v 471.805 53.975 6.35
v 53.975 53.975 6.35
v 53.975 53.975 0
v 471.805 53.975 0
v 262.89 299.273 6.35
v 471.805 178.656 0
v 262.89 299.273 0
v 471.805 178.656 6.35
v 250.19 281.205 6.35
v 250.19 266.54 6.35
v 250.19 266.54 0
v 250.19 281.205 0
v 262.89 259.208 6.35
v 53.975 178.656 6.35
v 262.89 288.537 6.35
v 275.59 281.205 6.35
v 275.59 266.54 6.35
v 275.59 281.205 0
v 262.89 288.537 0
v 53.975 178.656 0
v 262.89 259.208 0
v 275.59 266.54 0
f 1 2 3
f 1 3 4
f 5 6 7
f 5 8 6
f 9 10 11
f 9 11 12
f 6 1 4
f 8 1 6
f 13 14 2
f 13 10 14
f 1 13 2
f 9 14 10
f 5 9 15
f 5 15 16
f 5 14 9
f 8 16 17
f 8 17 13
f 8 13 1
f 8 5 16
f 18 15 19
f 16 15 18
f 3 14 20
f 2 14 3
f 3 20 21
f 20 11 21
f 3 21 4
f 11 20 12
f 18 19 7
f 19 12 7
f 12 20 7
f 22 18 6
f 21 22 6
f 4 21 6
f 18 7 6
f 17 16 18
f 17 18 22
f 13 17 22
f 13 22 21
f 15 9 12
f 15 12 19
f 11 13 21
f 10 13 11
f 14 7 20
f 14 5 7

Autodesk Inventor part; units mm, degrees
ref_plane "YZ Plane" through (0, 0, 0) normal (1, 0, 0) x (0, 1, 0)
ref_plane "XZ Plane" through (0, 0, 0) normal (0, 1, 0) x (-1, 0, 0)
ref_plane "XY Plane" through (0, 0, 0) normal (0, 0, 1) x (1, 0, 0)
sketch "Sketch1" plane through (0, 0, 0) normal (0, 0, 1) x (1, 0, 0)
  line L0 (0, 0) -> (0, 201.9592)
  line L1 (0, 201.9592) -> (262.89, 353.7388)
  line L2 (262.89, 353.7388) -> (525.78, 201.9592)
  line L3 (525.78, 201.9592) -> (525.78, 0)
  line L4 (525.78, 0) -> (0, 0)
  point P0 (262.89, 0)
  dimension "d0" = 525.78
  dimension "d1" = 120
  dimension "d2" = 201.9592
extrude "Extrusion1" add sketch "Sketch1" along normal blind 6.35
sketch "Sketch3" plane through (0, 0, 6.35) normal (0, 0, 1) x (1, 0, 0)
  line L0 (50.8, 180.4886) -> (474.98, 180.4886)
  line L1 (474.98, 180.4886) -> (474.98, 50.8)
  line L2 (474.98, 50.8) -> (50.8, 50.8)
  line L3 (50.8, 50.8) -> (50.8, 180.4886)
  line L4 (0, 201.9592) -> (0, 0) projected
  line L5 (50.8, 180.4886) -> (262.89, 302.9388)
  line L6 (262.89, 302.9388) -> (474.98, 180.4886)
  line L7 (525.78, 0) -> (0, 0) projected
  line L8 (0, 201.9592) -> (0, 0) projected
  line L9 (0, 0) -> (525.78, 0) projected
  line L10 (525.78, 0) -> (525.78, 201.9592) projected
  line L11 (525.78, 201.9592) -> (262.89, 353.7388) projected
  line L12 (262.89, 353.7388) -> (0, 201.9592) projected
  point P0 (262.89, 180.4886)
  dimension "d15" = 120
  dimension "d16" = 50.8
  dimension "d17" = 50.8
  dimension "d18" = 50.8
extrude "Extrusion3" cut sketch "Sketch3" against normal through all
sketch "Sketch8" plane through (0, 0, 6.35) normal (0, 0, 1) x (1, 0, 0)
  line L0 (50.8, 50.8) -> (474.98, 50.8) projected
  line L1 (50.8, 180.4886) -> (50.8, 50.8) projected
  line L2 (50.8, 50.8) -> (474.98, 50.8) projected
  line L3 (474.98, 50.8) -> (474.98, 180.4886) projected
  line L4 (474.98, 180.4886) -> (262.89, 302.9388) projected
  line L5 (262.89, 302.9388) -> (50.8, 180.4886) projected
  line L6 (53.975, 178.6555) -> (53.975, 53.975)
  line L7 (53.975, 53.975) -> (471.805, 53.975)
  line L8 (471.805, 53.975) -> (471.805, 178.6555)
  line L9 (471.805, 178.6555) -> (262.89, 299.2727)
  line L10 (262.89, 299.2727) -> (53.975, 178.6555)
  point P0 (0, 0)
  dimension "d48" = 3.175
extrude "Extrusion8" cut sketch "Sketch8" against normal through all
sketch "Sketch9" plane through (0, 0, 6.35) normal (0, 0, 1) x (1, 0, 0)
  line L0 (262.89, 288.5374) -> (275.59, 281.205)
  line L1 (275.59, 281.205) -> (275.59, 266.5403)
  line L2 (275.59, 266.5403) -> (262.89, 259.208)
  line L3 (262.89, 259.208) -> (250.19, 266.5403)
  line L4 (250.19, 266.5403) -> (250.19, 281.205)
  line L5 (250.19, 281.205) -> (262.89, 288.5374)
  point P0 (0, 0)
  point P1 (262.89, 273.8727)
  point P2 (262.89, 299.2727)
  dimension "d51" = 25.4
  dimension "d52" = 25.4
extrude "Extrusion9" cut sketch "Sketch9" against normal through all
equation "\"d3\" = Panel_Thickness"
equation "\"Panel_Thickness\" = 6.35"
equation "\"Fit_Tolerance\" = 1.27"
equation "\"Tool_Dia\" = 6.35"
properties part number "BA15" material "Wood (Cherry)"
